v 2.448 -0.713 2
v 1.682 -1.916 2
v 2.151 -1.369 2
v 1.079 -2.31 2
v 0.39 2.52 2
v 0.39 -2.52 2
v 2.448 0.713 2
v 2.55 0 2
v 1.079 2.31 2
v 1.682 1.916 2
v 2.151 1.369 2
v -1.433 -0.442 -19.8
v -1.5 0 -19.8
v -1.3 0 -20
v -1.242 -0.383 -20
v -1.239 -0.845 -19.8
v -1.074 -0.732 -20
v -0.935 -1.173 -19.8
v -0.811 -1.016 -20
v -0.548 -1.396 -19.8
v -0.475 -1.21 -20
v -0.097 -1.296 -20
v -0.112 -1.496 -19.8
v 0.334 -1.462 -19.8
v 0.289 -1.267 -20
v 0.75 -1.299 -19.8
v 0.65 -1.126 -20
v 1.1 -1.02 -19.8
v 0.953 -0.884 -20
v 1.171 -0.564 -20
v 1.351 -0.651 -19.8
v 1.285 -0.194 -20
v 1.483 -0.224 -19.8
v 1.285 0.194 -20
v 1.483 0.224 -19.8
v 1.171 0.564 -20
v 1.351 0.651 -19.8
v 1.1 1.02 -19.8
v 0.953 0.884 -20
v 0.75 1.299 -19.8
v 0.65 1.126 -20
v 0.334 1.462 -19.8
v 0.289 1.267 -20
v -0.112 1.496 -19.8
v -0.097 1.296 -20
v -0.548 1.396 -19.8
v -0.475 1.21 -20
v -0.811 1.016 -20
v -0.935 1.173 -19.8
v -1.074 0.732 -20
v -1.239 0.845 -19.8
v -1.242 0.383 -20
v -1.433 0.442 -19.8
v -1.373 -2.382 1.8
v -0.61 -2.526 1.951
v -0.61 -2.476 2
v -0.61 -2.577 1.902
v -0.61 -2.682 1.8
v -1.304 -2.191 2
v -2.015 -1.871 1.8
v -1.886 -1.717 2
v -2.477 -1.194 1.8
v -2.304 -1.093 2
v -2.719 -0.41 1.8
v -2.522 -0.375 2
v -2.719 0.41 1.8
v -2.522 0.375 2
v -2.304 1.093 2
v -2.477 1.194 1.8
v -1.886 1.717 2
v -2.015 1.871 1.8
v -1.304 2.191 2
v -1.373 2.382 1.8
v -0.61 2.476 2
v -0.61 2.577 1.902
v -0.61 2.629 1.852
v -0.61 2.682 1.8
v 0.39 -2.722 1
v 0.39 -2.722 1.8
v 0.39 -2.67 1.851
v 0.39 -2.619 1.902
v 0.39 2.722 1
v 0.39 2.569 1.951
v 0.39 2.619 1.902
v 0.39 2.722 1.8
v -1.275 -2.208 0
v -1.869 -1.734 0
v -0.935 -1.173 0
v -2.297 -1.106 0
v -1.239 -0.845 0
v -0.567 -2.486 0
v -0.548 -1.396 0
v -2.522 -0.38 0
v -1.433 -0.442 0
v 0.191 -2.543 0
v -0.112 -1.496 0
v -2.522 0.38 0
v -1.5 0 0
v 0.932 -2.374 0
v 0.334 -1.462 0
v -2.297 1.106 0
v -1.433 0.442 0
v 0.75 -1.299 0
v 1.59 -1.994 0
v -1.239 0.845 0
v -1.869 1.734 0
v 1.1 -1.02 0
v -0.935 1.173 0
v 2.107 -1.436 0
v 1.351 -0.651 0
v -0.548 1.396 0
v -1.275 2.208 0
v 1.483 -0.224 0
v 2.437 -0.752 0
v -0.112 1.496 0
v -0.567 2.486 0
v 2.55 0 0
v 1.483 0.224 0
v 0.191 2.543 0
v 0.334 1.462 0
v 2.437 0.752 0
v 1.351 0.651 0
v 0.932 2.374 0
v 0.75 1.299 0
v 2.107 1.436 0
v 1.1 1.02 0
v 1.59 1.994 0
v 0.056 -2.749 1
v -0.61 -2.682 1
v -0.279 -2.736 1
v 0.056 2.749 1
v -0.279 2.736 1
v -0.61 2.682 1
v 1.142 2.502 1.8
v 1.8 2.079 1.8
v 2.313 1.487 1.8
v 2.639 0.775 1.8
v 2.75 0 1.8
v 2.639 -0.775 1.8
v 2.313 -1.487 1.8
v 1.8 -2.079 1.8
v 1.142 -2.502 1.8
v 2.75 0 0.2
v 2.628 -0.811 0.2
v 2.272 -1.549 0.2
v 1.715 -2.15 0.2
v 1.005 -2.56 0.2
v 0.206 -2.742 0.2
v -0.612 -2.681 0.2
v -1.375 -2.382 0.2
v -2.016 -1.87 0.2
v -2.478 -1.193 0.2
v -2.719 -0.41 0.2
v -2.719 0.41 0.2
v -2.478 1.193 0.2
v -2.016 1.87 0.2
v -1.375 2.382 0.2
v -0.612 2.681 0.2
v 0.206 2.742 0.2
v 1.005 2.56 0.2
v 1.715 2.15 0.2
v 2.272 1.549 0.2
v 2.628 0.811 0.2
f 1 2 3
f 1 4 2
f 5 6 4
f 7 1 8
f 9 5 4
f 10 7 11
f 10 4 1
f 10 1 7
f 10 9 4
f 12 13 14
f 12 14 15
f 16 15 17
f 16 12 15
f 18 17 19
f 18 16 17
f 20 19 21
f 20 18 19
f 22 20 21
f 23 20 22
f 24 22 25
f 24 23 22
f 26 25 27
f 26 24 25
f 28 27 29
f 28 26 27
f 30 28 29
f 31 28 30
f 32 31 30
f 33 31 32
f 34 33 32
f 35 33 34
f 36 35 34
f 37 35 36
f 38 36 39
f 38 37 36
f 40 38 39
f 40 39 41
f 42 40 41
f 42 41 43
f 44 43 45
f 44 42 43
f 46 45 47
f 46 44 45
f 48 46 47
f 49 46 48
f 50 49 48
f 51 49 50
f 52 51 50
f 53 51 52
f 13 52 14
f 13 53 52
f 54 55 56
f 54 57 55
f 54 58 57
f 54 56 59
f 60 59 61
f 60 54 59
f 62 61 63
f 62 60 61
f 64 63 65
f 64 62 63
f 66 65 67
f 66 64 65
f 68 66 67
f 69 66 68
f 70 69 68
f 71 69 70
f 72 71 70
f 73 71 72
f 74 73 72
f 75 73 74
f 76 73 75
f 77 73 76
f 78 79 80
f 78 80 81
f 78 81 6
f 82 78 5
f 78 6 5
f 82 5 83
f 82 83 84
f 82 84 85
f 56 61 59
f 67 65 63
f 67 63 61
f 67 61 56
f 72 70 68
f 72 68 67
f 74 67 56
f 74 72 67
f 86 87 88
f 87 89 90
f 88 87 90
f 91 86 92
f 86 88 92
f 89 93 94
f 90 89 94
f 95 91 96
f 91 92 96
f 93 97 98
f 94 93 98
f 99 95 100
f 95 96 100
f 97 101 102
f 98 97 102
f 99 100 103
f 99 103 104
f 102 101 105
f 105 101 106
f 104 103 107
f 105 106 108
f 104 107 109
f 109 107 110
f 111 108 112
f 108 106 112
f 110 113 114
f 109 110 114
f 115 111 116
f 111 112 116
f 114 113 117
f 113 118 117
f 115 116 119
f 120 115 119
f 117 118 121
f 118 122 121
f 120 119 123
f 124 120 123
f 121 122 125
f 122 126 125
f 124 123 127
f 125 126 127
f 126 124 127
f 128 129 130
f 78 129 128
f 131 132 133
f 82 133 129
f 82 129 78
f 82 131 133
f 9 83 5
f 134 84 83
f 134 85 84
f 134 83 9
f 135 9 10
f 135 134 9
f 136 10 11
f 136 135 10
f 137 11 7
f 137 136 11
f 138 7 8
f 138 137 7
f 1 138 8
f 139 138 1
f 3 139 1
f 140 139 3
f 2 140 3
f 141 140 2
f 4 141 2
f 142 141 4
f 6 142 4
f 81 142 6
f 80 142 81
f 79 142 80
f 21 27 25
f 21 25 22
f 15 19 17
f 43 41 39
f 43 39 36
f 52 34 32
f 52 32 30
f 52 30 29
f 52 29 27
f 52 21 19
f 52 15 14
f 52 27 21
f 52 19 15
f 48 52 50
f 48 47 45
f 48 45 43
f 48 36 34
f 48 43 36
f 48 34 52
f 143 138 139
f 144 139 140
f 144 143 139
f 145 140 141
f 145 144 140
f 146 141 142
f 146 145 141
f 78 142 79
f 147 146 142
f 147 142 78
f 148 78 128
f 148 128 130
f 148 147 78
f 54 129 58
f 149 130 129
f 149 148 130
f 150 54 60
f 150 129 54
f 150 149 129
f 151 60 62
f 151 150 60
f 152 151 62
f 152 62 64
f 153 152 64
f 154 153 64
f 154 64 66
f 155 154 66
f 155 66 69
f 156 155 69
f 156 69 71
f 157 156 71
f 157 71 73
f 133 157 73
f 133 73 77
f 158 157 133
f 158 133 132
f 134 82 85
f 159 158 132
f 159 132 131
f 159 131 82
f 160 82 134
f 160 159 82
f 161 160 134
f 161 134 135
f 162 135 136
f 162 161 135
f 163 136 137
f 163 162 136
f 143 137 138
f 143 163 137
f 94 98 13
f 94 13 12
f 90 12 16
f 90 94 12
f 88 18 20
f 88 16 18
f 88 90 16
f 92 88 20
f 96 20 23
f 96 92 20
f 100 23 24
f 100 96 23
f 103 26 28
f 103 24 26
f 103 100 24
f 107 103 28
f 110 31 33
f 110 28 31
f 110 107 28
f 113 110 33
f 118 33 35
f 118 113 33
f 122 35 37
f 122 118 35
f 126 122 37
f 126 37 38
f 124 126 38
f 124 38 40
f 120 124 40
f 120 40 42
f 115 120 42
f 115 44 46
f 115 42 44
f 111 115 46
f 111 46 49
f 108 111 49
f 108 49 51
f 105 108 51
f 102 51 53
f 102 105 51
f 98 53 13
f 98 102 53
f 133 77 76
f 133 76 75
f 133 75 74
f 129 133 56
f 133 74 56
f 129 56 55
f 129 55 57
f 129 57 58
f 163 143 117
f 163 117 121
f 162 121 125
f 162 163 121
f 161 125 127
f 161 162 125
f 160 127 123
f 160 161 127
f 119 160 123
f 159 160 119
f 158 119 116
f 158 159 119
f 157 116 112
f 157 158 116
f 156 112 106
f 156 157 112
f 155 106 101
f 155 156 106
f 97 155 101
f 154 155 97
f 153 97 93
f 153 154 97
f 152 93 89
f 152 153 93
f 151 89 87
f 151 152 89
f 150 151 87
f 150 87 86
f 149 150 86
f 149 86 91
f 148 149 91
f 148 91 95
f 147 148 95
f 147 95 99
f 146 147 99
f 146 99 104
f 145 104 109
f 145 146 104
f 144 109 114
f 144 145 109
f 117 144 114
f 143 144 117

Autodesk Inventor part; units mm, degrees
ref_plane "YZ Plane" through (0, 0, 0) normal (1, 0, 0) x (0, 1, 0)
ref_plane "XZ Plane" through (0, 0, 0) normal (0, 1, 0) x (-1, 0, 0)
ref_plane "XY Plane" through (0, 0, 0) normal (0, 0, 1) x (1, 0, 0)
sketch "Náčrt1" plane through (0, 0, 0) normal (0, 0, 1) x (1, 0, 0)
  circle A0 centre (0, 0) radius 2.75
  dimension "d0" = 5.5
extrude "Vysunutí1" add sketch "Náčrt1" along normal blind 2
chamfer "Zkosení1" distance 0.2 angle 45 1 edges at (-2.75, 0, 2)
chamfer "Zkosení2" distance 0.2 angle 45 1 edges at (-2.75, 0, 0)
sketch "Náčrt2" plane through (0, 0, 2) normal (0, 0, 1) x (1, 0, 0)
  line L0 (-0.6097, -6) -> (0.3903, -6)
  line L1 (0.3903, -6) -> (0.3903, 6)
  line L2 (0.3903, 6) -> (-0.6097, 6)
  line L3 (-0.6097, 6) -> (-0.6097, -6)
  line L4 (-0.6097, -6) -> (0.3903, 6) construction
  line L5 (0.3903, -6) -> (-0.6097, 6) construction
  point P0 (0, 0)
  point P1 (-0.1097, 0)
  dimension "d9" = 1
extrude "Vysunutí2" cut sketch "Náčrt2" against normal blind 1
sketch "Náčrt3" plane through (0, 0, 0) normal (0, 0, -1) x (-1, 0, 0)
  circle A0 centre (0, 0) radius 1.5
  dimension "d12" = 3
extrude "Vysunutí3" add sketch "Náčrt3" along normal blind 20
chamfer "Zkosení3" distance 0.2 angle 45 1 edges at (1.5, 0, -20)
thread "Závit1" size "M3x0.5" class "6g" standard "ANSI Metric M Profile" length 13
properties part number "Bolt-M3x20" material "Ocel, vysokopevnostní, nízkolegovaná"
